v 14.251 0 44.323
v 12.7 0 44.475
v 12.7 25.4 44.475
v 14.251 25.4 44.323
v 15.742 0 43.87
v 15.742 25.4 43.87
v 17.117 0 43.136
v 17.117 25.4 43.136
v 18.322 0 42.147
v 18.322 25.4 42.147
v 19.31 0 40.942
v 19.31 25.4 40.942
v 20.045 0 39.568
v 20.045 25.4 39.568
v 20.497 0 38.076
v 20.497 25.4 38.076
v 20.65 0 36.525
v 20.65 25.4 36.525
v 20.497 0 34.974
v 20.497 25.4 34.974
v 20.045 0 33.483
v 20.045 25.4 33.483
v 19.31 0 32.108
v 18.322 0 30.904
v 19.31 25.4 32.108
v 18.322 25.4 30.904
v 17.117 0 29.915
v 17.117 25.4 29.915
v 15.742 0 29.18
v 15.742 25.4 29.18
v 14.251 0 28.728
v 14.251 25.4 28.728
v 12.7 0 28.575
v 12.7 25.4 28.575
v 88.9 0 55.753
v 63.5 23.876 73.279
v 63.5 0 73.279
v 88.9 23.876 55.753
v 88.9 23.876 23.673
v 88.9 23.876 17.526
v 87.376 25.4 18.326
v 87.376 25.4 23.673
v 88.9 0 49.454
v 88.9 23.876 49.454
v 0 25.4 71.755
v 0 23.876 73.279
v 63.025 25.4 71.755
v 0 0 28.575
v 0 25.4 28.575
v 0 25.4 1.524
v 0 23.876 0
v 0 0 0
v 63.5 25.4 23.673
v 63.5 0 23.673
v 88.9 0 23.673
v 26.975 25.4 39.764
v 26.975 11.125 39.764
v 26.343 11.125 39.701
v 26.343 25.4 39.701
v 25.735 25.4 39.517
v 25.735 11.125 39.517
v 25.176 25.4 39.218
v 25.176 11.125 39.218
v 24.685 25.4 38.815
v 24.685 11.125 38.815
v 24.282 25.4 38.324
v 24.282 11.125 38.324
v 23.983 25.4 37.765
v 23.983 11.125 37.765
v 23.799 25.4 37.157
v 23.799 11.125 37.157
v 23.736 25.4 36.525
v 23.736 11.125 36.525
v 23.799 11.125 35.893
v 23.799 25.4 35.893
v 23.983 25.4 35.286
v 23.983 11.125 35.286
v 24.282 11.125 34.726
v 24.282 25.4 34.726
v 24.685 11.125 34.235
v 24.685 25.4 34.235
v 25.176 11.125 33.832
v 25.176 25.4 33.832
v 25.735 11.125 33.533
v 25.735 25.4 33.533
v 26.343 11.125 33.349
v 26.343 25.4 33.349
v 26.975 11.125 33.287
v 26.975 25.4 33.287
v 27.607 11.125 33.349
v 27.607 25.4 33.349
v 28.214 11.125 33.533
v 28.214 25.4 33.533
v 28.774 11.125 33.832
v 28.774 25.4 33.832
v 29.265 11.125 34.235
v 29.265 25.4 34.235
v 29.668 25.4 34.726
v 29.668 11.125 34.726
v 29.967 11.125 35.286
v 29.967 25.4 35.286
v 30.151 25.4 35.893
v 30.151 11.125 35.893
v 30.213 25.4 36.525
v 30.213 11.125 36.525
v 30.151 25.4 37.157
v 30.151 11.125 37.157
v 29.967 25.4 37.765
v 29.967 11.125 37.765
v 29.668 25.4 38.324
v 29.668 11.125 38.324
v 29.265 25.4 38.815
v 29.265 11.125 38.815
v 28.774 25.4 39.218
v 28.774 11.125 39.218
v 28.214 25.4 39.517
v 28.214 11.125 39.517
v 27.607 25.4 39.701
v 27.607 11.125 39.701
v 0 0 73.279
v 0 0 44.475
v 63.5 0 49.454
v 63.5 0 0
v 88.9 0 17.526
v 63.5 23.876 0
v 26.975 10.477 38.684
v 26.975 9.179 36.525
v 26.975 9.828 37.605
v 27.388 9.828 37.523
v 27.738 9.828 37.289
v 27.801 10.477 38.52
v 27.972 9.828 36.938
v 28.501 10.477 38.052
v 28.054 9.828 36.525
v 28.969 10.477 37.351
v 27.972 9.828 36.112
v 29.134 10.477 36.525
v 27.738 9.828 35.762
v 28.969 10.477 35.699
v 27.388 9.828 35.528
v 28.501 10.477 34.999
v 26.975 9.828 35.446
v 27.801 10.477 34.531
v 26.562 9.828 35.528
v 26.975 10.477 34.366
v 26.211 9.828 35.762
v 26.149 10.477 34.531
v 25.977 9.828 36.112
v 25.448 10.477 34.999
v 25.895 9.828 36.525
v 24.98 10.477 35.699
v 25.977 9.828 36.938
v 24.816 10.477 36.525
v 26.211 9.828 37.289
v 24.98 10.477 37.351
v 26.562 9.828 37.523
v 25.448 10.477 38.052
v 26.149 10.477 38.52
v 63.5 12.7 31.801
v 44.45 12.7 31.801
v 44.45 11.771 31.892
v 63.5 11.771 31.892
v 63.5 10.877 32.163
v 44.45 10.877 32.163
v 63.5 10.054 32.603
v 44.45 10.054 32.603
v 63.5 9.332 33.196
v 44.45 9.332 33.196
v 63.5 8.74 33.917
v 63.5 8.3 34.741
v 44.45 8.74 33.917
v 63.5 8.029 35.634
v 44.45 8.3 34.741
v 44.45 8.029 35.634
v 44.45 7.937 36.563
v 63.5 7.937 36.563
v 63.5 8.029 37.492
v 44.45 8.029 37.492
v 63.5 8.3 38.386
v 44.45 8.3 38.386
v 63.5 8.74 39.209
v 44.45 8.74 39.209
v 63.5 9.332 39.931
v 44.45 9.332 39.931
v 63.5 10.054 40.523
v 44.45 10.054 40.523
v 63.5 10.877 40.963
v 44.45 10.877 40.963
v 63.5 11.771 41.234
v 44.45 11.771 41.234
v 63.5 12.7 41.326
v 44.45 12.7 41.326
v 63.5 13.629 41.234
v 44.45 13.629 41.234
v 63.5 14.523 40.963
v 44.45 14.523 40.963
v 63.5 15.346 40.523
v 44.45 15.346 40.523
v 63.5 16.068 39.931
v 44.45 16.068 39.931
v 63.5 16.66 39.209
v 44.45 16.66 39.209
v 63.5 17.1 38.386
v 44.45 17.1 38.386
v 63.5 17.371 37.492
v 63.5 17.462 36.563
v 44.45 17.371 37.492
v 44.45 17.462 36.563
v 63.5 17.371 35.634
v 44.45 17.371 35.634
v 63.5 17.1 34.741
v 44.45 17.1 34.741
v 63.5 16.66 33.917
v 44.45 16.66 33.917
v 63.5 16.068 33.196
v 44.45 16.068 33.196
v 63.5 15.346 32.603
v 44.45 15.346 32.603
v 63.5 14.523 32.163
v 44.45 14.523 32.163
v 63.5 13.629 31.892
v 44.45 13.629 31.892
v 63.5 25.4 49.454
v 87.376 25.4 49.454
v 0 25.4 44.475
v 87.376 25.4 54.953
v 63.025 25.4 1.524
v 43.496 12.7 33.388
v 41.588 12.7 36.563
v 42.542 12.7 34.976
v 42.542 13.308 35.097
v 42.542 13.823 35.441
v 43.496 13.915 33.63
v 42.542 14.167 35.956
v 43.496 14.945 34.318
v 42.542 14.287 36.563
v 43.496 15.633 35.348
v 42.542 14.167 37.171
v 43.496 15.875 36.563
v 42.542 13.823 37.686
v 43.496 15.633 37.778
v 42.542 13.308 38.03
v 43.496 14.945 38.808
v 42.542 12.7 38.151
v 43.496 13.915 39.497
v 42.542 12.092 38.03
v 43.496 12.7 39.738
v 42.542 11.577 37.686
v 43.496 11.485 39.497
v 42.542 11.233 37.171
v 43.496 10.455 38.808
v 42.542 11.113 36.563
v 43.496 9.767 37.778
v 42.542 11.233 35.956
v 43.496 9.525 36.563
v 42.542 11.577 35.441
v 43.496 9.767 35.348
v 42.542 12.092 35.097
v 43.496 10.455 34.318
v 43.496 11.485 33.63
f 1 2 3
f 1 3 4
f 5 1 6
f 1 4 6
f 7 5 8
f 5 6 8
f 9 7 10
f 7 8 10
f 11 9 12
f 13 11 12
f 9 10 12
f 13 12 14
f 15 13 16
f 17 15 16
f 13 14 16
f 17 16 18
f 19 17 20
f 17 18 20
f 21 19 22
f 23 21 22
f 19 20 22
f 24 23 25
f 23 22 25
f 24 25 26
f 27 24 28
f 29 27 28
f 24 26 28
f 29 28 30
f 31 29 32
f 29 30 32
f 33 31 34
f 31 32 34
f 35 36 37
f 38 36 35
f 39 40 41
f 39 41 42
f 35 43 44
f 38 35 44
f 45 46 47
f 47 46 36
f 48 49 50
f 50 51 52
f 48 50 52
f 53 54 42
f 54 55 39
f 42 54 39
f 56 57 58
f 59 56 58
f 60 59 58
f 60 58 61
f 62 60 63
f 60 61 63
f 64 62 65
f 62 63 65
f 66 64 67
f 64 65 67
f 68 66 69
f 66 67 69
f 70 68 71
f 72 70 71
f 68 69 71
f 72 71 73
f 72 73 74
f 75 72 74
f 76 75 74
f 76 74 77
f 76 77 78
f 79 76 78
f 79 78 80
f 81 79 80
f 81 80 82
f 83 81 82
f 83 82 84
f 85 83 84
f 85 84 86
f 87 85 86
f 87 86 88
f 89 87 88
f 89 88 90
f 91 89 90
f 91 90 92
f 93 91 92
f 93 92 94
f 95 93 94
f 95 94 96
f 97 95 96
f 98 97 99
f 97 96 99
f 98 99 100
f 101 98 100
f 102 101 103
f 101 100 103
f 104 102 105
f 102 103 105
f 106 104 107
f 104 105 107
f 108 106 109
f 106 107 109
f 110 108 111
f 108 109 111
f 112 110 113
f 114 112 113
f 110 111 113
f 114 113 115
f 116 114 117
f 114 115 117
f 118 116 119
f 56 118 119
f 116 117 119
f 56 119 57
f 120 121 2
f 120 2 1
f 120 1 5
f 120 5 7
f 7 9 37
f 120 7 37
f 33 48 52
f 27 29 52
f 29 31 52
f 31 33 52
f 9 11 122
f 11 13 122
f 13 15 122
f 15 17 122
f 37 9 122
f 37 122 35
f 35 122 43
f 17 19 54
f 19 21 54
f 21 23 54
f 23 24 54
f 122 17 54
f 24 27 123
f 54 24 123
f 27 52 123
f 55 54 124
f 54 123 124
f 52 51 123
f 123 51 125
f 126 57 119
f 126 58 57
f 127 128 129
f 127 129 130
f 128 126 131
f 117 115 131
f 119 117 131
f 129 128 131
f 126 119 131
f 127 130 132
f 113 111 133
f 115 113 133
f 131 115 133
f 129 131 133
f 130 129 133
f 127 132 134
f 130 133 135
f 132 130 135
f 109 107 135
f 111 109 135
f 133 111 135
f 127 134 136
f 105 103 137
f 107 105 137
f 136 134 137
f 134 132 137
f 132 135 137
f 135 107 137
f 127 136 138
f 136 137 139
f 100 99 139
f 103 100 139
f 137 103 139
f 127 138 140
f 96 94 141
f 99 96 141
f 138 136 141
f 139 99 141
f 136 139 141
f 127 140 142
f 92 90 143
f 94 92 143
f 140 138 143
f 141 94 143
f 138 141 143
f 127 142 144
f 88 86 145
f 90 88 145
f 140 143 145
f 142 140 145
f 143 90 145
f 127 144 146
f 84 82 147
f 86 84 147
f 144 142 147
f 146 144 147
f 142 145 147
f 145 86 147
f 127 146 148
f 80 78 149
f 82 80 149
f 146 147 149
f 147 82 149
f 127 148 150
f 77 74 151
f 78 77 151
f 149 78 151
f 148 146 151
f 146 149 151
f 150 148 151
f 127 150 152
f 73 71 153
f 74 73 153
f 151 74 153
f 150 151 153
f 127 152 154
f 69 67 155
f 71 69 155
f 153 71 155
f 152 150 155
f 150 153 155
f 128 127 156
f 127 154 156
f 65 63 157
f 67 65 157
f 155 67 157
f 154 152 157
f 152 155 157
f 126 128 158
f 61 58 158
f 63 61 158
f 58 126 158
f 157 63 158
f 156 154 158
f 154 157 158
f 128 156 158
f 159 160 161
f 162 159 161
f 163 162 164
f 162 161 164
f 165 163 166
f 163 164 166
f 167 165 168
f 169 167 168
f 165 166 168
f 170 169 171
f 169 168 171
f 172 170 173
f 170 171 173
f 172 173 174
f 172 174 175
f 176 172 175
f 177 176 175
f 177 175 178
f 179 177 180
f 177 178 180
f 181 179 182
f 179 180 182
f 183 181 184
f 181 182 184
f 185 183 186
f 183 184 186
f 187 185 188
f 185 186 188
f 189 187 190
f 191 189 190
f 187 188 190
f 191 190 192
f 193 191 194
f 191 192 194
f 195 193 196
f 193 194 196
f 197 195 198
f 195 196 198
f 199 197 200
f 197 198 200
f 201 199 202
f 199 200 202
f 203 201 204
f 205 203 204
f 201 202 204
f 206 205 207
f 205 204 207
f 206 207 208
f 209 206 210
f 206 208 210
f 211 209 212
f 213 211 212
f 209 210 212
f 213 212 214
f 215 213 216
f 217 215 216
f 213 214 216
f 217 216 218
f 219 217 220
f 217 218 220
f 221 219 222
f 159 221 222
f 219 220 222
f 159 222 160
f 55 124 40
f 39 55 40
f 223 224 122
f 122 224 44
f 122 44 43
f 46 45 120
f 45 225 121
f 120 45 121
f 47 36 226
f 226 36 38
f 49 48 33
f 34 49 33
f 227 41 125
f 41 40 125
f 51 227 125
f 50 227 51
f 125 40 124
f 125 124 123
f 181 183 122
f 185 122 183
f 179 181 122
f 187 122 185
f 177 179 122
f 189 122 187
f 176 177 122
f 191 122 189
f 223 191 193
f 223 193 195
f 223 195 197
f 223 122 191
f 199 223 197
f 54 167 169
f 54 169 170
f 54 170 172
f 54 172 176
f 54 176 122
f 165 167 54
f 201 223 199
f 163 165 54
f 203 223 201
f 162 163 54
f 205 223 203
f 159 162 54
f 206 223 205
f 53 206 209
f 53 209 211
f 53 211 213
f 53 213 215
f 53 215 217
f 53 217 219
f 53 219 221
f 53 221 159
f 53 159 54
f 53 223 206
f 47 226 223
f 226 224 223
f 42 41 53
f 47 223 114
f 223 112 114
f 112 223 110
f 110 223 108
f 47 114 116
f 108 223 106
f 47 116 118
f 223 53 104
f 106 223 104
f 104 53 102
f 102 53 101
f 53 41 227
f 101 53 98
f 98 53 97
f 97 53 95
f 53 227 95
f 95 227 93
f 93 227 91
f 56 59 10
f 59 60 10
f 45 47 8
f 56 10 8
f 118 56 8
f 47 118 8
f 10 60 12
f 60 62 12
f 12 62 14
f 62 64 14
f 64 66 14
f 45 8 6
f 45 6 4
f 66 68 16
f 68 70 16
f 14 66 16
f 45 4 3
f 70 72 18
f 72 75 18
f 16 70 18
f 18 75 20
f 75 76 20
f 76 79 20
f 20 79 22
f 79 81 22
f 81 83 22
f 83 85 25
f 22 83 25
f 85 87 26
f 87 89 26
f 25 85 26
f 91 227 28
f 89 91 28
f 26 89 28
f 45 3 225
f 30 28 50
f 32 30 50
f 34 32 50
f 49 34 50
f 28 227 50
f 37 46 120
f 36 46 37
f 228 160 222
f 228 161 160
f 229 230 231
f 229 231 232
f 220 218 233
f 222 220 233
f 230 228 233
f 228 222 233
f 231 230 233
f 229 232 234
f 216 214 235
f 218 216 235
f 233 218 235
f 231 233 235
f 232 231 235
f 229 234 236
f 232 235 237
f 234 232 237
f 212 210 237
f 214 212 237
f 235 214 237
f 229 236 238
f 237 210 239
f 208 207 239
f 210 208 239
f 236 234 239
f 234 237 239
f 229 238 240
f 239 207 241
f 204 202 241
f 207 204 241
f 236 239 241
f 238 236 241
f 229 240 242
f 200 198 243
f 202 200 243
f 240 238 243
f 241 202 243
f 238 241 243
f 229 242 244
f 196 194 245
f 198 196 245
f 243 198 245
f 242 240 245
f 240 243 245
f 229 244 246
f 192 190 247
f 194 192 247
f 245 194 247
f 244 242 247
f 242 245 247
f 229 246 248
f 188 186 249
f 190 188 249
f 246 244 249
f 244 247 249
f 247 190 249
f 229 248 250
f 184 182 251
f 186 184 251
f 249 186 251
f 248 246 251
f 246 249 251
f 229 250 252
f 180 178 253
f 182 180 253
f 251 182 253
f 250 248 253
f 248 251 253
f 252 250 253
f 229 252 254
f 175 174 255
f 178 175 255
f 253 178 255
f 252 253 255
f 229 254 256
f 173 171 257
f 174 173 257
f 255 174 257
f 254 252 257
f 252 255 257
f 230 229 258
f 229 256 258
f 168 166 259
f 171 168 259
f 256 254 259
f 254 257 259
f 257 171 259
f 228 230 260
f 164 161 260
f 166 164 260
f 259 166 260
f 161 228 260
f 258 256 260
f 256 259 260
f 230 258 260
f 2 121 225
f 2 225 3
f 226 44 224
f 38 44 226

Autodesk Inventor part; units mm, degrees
ref_plane "YZ Plane" through (0, 0, 0) normal (1, 0, 0) x (0, 1, 0)
ref_plane "XZ Plane" through (0, 0, 0) normal (0, 1, 0) x (-1, 0, 0)
ref_plane "XY Plane" through (0, 0, 0) normal (0, 0, 1) x (1, 0, 0)
sketch "Sketch1" plane through (0, 0, 0) normal (0, 0, 1) x (1, 0, 0)
  line L0 (0, 0) -> (88.9, 0)
  line L1 (88.9, 0) -> (88.9, 25.4)
  line L2 (88.9, 25.4) -> (0, 25.4)
  line L3 (0, 25.4) -> (0, 0)
  dimension "d0" = 25.4
  dimension "d1" = 88.9
extrude "Extrusion1" add sketch "Sketch1" along normal blind 73.279
sketch "Sketch2" plane through (0, 25.4, 0) normal (0, 1, 0) x (1, 0, 0)
  line L0 (0, -44.4754) -> (0, -28.575)
  line L1 (0, -28.575) -> (12.7, -28.575)
  line L2 (0, -44.4754) -> (12.7, -44.4754)
  arc A0 (12.7, -44.4754) -> (12.7, -28.575) centre (12.7, -36.5252) ccw
  line L3 (88.9, 0) -> (0, 0) projected
  line L4 (0, 0) -> (0, -73.279) projected
  dimension "d5" = 36.5252
  dimension "d6" = 7.9502
  dimension "d7" = 12.7
  dimension "d8" = 0
  dimension "d9" = 12.7
  dimension "d10" = 12.7
extrude "Extrusion2" cut sketch "Sketch2" against normal blind 73.279
sketch "Sketch3" plane through (0, 25.4, 0) normal (0, 1, 0) x (1, 0, 0)
  line L0 (0, -73.279) -> (88.9, -73.279) projected
  line L1 (63.5, -73.279) -> (88.9, -55.753)
  line L2 (88.9, 0) -> (88.9, -73.279) projected
  line L3 (88.9, -73.279) -> (63.5, -73.279)
  line L4 (88.9, -73.279) -> (88.9, -55.753)
  line L5 (63.5, 0) -> (88.9, 0)
  line L6 (88.9, 0) -> (0, 0) projected
  line L7 (88.9, -17.526) -> (63.5, 0)
  line L8 (88.9, -17.526) -> (88.9, 0)
  line L9 (0, -44.4754) -> (0, -73.279) projected
  line L10 (0, 0) -> (0, -28.575) projected
  dimension "d13" = 17.526
  dimension "d14" = 17.526
  dimension "d15" = 63.5
  dimension "d16" = 63.5
extrude "Extrusion3" cut sketch "Sketch3" against normal blind 73.279
sketch "Sketch4" plane through (88.9, 0, 55.753) normal (1, 0, 0) x (0, 0, -1)
  line L0 (0, 25.4) -> (0, 0) projected
  line L1 (55.753, 25.4) -> (27.178, 25.4) projected
  line L2 (6.2992, 0) -> (32.0802, 0)
  line L3 (32.0802, 0) -> (32.0802, 25.4)
  line L4 (32.0802, 25.4) -> (6.2992, 25.4)
  line L5 (6.2992, 25.4) -> (6.2992, 0)
  line L6 (-17.526, 0) -> (-17.526, 25.4) projected
  point P0 (55.753, 0)
  dimension "d19" = 25.781
  dimension "d20" = 23.8252
extrude "Extrusion4" cut sketch "Sketch4" against normal blind 25.4
chamfer "Chamfer1" distance 1.524 angle 45 6 edges at (31.75, 25.4, 73.279) (76.2, 25.4, 64.516) (88.9, 25.4, 52.6034) (88.9, 25.4, 20.5994) (76.2, 25.4, 8.763) (31.75, 25.4, 0)
sketch "Sketch5" plane through (0, 25.4, 28.575) normal (0, 1, 0) x (1, 0, 0)
  line L0 (0, 27.051) -> (0, 0) projected
  line L1 (63.5, 28.575) -> (0, 28.575) projected
  point P0 (26.9748, -7.9502)
  dimension "d26" = 26.9748
  dimension "d27" = 36.5252
hole "Hole1" at (26.9748, 25.4, 36.5252) direction (0, -1, 0) diameter 6.477 depth 14.2748 tip angle 118
sketch "Sketch6" plane through (63.5, 0, 55.753) normal (1, 0, 0) x (0, 0, -1)
  line L0 (6.2992, 25.4) -> (32.0802, 25.4) projected
  line L1 (6.2992, 0) -> (6.2992, 23.876) projected
  point P0 (55.753, 0)
  point P1 (19.1897, 12.7)
  dimension "d35" = 12.7
  dimension "d36" = 12.8905
hole "Hole2" at (63.5, 12.7, 36.5633) direction (-1, 0, 0) diameter 9.525 depth 19.05 tip angle 118
properties part number "7.2 Q6"
